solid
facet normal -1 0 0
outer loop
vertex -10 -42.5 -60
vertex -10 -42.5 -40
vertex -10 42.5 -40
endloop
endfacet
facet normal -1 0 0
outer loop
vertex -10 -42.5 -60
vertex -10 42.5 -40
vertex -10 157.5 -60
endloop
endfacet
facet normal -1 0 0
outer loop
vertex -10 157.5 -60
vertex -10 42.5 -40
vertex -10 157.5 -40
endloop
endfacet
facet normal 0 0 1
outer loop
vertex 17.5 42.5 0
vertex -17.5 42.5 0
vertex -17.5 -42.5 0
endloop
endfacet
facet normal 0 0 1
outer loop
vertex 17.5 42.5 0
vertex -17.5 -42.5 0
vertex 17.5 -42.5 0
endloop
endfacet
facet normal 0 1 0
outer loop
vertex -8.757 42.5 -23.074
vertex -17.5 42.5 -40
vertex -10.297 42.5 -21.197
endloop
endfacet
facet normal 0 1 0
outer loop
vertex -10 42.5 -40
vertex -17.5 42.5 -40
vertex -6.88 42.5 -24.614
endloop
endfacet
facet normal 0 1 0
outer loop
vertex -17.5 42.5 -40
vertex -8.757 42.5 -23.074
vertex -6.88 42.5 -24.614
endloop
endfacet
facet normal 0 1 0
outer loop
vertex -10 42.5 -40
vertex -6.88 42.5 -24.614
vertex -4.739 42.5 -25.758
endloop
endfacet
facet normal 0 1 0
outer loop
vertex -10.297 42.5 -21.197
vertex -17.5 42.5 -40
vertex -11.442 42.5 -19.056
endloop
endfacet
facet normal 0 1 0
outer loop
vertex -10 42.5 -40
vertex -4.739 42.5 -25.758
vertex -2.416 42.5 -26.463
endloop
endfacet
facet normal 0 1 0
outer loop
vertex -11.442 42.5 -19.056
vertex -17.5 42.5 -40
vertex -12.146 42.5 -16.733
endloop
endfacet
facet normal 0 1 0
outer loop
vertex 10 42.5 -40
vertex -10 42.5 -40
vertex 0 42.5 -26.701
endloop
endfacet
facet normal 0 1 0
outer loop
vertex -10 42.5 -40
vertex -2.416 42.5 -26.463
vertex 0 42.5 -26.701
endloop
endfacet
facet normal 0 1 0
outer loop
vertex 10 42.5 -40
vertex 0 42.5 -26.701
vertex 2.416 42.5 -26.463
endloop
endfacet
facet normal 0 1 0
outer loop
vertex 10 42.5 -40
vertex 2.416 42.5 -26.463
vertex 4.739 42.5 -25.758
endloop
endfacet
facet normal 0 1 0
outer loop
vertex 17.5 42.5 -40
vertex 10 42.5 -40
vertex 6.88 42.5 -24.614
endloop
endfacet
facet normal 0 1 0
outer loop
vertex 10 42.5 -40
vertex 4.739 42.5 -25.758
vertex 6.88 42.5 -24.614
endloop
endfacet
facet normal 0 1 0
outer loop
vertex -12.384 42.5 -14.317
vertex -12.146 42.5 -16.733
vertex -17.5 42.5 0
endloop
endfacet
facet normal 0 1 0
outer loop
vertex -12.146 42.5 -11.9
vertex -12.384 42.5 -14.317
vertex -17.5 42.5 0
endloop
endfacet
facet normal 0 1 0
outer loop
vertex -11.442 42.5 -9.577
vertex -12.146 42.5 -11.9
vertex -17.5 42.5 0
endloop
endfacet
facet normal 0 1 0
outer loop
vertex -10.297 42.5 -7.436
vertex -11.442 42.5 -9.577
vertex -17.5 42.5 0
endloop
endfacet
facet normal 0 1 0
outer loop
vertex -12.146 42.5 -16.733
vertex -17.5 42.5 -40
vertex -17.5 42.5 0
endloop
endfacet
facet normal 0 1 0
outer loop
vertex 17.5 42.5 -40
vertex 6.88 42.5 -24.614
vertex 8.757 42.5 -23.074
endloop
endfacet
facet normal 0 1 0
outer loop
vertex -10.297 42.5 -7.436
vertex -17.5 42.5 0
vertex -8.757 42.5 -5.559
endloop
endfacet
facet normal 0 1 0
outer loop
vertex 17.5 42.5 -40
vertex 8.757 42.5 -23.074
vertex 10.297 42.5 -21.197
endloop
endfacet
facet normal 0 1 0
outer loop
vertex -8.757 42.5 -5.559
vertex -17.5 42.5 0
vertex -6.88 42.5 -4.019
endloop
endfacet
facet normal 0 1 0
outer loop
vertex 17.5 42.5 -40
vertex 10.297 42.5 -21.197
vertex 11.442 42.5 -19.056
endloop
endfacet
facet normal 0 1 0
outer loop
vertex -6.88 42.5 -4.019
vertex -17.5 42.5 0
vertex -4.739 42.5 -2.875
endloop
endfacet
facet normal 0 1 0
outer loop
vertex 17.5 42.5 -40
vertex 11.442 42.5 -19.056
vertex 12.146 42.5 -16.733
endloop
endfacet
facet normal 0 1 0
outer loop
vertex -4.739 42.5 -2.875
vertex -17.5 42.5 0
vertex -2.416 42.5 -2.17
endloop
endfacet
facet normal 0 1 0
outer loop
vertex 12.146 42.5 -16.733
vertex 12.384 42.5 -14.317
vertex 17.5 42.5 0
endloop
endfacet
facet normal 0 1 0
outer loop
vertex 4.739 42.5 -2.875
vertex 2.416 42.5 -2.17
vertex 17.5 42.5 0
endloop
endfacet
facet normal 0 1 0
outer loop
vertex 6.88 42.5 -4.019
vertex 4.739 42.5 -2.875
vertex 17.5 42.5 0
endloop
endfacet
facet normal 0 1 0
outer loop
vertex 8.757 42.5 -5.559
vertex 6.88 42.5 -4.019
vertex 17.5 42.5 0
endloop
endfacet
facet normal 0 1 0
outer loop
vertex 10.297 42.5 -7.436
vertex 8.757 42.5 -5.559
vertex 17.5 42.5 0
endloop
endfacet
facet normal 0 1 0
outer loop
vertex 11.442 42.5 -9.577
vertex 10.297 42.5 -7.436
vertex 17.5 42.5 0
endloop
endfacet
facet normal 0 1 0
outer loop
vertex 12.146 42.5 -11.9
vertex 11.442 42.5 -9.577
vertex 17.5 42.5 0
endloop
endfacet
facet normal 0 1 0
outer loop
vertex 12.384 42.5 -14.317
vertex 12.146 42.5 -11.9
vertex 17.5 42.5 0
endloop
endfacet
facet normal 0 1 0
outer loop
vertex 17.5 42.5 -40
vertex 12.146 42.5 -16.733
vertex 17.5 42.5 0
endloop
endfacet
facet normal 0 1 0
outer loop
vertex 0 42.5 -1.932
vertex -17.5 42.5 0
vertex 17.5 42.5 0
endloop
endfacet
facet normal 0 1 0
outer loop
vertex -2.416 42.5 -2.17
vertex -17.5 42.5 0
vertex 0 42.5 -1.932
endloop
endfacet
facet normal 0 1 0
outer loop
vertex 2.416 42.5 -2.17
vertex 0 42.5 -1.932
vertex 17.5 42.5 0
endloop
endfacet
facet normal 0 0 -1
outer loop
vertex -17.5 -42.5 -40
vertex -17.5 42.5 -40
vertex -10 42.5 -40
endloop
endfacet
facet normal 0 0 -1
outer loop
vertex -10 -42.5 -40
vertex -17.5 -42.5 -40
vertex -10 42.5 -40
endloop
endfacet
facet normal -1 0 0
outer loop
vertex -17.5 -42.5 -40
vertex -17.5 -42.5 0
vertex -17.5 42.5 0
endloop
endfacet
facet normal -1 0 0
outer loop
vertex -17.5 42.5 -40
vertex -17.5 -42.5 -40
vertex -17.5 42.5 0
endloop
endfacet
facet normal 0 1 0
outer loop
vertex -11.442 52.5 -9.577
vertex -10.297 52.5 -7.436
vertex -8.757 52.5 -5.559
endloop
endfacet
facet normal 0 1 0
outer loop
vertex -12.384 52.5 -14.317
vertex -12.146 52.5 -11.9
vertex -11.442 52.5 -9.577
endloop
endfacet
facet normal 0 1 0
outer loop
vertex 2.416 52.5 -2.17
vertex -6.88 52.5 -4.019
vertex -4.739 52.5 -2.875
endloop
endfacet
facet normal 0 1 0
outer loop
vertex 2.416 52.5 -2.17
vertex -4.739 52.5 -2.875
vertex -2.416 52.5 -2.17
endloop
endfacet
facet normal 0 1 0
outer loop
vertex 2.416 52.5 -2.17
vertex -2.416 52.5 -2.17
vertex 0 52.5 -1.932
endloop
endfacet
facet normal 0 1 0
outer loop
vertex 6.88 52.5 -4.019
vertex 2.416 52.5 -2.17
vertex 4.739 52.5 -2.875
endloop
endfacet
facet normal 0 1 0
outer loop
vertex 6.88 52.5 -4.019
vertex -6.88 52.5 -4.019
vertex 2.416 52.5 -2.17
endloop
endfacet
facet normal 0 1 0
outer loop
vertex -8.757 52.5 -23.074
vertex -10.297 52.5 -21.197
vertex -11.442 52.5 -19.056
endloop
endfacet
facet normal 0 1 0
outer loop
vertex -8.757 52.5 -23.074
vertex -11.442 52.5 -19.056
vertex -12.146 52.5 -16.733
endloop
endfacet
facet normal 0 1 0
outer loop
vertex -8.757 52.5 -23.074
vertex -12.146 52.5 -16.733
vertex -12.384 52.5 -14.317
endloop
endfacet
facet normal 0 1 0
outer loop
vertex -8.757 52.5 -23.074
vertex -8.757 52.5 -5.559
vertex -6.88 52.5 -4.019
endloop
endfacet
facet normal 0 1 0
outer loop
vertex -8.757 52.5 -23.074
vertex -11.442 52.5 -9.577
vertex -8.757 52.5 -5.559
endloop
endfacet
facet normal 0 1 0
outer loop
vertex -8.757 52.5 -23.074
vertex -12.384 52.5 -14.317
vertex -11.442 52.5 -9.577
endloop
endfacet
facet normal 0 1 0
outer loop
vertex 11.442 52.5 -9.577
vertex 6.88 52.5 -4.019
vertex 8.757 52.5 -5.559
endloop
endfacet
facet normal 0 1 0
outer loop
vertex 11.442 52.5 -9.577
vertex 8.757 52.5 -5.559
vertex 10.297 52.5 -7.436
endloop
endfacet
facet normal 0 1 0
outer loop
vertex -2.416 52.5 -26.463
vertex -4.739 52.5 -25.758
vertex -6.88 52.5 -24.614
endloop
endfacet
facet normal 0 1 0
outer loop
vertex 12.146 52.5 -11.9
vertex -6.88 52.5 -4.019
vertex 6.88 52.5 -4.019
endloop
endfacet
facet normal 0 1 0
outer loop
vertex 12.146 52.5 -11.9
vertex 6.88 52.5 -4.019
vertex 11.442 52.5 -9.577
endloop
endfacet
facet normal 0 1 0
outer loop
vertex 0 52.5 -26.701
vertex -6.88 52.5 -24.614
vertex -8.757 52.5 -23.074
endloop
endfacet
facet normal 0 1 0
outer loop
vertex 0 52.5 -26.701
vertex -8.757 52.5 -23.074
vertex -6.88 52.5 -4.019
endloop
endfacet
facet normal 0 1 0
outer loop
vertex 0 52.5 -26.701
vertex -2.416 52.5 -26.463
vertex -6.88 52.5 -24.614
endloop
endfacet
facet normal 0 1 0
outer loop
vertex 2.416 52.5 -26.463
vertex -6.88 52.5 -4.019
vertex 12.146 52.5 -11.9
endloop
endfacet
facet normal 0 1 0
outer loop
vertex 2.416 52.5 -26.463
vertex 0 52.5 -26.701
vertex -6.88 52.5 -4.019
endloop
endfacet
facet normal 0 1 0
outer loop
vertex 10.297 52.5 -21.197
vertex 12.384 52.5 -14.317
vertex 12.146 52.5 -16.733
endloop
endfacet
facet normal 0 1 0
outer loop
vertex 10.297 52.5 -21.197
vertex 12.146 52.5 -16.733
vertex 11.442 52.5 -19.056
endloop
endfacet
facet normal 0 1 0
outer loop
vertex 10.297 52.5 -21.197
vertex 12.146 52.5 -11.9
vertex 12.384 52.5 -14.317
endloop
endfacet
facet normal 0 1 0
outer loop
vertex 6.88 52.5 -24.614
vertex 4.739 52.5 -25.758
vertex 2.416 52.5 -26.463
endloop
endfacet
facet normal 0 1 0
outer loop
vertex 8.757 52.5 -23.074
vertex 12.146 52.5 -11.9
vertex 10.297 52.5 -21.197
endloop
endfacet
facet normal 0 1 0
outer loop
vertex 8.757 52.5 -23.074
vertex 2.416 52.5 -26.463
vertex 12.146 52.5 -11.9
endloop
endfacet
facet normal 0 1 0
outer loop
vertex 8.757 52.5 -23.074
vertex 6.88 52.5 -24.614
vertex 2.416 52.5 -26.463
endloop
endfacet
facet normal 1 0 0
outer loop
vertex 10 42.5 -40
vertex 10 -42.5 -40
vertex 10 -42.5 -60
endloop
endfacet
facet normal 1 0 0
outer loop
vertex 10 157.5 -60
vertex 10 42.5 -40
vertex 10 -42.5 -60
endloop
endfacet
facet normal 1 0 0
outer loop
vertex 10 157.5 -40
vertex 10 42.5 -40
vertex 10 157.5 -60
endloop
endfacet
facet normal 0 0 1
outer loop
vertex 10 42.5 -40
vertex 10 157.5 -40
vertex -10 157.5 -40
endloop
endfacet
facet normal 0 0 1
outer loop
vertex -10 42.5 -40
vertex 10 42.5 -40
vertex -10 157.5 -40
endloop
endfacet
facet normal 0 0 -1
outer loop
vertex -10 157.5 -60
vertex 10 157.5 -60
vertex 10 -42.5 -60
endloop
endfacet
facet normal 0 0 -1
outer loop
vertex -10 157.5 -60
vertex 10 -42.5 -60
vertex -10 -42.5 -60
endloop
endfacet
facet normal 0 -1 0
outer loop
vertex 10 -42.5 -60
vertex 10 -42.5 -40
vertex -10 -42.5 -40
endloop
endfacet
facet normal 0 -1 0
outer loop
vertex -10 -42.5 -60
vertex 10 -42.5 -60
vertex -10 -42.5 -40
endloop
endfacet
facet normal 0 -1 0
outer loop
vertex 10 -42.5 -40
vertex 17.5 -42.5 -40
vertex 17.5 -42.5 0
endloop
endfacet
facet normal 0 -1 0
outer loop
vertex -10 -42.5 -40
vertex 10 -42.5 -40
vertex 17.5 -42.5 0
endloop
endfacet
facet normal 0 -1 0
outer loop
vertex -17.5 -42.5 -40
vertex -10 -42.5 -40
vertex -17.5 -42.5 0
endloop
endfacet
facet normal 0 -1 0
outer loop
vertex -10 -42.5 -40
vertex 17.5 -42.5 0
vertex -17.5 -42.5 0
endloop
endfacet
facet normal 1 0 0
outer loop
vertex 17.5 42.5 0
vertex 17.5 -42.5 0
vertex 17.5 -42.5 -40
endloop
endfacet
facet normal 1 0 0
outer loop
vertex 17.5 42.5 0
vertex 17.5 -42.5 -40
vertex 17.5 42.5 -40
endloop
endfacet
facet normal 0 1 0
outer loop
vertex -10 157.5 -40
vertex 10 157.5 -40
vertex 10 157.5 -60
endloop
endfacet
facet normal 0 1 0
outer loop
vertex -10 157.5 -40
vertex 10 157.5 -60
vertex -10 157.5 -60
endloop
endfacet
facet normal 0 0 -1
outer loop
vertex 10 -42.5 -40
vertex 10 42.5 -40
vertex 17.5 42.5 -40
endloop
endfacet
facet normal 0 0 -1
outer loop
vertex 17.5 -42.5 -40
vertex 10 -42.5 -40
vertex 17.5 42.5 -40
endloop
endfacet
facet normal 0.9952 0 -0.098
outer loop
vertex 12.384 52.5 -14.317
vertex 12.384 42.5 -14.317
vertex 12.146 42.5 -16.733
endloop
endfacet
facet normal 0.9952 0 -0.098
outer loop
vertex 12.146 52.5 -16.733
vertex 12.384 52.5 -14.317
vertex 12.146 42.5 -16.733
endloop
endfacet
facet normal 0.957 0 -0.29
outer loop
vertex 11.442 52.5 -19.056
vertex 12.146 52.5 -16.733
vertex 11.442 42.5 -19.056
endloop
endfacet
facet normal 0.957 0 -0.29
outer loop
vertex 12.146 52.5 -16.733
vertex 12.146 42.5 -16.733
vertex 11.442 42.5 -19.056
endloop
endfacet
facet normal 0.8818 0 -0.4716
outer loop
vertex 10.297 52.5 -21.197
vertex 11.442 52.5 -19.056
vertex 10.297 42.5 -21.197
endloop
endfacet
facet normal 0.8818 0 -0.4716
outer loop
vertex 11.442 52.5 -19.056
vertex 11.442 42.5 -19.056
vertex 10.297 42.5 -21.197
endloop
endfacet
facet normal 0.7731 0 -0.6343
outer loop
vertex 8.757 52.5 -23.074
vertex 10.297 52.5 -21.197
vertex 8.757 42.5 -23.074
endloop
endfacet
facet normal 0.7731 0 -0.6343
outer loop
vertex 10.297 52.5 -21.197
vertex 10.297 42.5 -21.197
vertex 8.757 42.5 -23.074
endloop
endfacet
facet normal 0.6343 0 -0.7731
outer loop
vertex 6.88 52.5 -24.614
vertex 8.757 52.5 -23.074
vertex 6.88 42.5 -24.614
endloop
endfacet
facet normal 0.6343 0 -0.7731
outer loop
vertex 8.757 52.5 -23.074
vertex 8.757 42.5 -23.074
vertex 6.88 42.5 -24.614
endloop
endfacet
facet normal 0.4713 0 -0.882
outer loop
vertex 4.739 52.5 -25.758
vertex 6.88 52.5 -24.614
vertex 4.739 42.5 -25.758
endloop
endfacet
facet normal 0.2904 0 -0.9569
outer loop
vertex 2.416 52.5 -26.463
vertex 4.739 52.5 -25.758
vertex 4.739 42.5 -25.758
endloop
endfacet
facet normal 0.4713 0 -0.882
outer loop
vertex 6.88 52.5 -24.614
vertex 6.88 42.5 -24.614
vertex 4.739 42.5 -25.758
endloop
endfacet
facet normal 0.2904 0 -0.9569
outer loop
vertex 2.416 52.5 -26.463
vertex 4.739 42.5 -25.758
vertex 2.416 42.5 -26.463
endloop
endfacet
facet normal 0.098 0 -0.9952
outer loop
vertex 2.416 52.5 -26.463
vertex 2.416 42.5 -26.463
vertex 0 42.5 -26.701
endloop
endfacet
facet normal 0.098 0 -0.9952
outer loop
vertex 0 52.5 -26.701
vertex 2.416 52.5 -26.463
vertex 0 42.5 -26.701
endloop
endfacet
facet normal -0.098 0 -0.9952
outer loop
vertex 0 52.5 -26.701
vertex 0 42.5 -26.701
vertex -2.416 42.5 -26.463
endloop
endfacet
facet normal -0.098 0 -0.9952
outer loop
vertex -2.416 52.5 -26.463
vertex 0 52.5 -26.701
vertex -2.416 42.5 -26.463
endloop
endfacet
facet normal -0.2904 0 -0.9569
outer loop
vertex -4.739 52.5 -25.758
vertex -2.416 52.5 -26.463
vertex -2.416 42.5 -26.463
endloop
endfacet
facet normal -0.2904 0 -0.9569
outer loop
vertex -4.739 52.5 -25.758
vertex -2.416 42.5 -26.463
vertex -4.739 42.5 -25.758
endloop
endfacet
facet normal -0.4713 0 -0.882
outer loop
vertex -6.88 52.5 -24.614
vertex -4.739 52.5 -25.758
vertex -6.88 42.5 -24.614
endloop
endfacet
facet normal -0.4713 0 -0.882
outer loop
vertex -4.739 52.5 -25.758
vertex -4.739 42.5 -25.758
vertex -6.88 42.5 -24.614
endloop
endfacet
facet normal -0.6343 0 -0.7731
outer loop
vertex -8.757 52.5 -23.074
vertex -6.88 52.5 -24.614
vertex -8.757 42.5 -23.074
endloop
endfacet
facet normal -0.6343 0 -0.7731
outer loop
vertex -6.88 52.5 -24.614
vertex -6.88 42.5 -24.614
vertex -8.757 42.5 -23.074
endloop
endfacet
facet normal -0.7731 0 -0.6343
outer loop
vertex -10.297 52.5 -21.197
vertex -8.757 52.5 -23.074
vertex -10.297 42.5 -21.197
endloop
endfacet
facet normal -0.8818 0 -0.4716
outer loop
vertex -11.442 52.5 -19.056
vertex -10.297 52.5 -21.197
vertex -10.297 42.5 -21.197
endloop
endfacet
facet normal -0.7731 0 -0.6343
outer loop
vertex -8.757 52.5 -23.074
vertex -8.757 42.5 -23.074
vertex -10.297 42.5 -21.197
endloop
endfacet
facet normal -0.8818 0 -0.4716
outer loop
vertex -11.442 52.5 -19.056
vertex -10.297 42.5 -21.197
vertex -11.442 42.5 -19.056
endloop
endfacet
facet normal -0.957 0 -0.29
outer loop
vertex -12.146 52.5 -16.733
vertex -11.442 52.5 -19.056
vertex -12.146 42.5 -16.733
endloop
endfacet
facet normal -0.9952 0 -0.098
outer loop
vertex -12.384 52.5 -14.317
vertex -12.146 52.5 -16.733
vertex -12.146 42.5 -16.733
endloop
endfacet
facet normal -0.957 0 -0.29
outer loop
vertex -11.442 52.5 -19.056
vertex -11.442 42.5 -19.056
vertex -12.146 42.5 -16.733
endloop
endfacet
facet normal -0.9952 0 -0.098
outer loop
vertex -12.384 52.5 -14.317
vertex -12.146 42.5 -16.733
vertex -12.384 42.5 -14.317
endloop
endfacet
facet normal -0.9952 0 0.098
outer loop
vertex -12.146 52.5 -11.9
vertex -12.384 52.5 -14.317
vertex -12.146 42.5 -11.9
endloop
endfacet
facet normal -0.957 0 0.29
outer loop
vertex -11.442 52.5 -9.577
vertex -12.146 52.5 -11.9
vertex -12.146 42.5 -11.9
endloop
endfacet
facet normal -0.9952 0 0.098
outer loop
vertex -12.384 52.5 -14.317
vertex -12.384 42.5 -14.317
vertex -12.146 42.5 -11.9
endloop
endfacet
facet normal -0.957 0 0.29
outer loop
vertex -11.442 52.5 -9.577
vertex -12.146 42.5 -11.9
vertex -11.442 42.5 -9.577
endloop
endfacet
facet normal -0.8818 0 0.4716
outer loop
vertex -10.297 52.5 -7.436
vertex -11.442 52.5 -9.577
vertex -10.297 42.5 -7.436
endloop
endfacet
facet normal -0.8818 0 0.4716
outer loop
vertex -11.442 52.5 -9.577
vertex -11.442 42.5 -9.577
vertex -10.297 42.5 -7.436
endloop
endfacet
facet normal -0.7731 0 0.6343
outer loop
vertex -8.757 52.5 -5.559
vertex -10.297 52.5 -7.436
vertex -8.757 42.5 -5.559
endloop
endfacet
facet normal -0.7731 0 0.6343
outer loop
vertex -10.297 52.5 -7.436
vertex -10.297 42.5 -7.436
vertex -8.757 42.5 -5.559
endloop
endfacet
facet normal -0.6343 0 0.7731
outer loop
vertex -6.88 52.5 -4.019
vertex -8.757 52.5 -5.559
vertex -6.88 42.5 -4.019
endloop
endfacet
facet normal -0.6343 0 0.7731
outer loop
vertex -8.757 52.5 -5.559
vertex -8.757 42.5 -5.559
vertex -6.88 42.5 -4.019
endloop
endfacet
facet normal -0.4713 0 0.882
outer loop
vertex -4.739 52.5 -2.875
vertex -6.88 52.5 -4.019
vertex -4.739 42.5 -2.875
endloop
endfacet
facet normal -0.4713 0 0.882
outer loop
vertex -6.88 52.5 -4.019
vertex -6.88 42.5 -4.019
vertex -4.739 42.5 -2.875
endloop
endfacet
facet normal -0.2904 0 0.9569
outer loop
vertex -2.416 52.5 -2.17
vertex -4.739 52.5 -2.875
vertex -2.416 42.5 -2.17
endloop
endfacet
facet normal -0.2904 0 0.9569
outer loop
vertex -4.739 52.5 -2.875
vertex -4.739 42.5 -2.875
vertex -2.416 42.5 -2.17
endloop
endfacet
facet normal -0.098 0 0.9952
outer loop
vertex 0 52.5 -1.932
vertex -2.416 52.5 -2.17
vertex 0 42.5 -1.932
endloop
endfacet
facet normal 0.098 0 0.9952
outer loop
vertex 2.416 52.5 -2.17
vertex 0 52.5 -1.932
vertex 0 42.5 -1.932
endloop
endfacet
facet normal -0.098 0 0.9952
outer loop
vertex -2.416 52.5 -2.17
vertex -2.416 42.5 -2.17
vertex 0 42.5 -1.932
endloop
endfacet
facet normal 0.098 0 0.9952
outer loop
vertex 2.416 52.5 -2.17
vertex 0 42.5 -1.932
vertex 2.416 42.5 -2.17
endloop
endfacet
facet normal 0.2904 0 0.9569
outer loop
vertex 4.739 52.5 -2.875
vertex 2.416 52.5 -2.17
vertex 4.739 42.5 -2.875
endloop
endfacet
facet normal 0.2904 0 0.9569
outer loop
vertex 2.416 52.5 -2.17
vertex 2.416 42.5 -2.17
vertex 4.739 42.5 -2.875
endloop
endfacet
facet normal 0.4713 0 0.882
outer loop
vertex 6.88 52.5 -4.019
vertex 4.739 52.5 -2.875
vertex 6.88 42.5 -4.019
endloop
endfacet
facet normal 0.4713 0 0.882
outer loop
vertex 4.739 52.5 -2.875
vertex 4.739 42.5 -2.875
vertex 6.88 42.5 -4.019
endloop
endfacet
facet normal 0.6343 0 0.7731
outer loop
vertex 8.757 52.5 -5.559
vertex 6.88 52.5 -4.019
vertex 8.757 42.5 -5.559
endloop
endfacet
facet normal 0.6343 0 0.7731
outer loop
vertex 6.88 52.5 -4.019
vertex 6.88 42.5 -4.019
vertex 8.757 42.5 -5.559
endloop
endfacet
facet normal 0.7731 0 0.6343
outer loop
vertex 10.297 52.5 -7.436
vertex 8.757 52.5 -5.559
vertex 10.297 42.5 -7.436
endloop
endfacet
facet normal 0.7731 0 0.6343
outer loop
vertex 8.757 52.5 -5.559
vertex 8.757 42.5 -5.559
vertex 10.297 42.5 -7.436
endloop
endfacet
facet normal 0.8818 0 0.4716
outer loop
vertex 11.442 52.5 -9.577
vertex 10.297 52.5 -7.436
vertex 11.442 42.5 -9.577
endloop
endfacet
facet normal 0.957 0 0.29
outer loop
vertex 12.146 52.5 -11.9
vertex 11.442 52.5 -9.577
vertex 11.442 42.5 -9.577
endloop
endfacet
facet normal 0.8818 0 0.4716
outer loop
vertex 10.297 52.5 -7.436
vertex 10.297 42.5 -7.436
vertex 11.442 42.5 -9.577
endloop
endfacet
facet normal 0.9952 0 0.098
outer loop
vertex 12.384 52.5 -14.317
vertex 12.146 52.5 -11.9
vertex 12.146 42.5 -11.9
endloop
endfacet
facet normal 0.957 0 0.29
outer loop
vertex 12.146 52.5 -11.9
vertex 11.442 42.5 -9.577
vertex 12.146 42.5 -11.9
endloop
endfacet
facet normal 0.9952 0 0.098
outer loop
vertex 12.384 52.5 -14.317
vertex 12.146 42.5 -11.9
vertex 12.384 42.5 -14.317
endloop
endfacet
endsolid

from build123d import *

# Parameters (mm, degrees)
SKIZZE1_W                       = 35
SKIZZE1_H                       = 85
AUFSATZ_LINEAR_AUSTRAGEN1_DEPTH = 40
SKIZZE2_R                       = 12.384443891
AUFSATZ_LINEAR_AUSTRAGEN2_DEPTH = 10
SKIZZE3_W                       = 20
SKIZZE3_H                       = 200
AUFSATZ_LINEAR_AUSTRAGEN3_DEPTH = 20


with BuildPart() as part:
    # Skizze1 → Aufsatz-Linear austragen1 (new body)
    with BuildSketch(Plane.XY):
        Rectangle(SKIZZE1_W, SKIZZE1_H)
    extrude(amount=-AUFSATZ_LINEAR_AUSTRAGEN1_DEPTH)

    # Skizze2 → Aufsatz-Linear austragen2 (add)
    with BuildSketch(Plane(origin=(0, 42.5, 0), x_dir=(1, 0, 0), z_dir=(0, 1, 0))):
        with Locations((0, 14.316526297)):
            Circle(SKIZZE2_R)
    extrude(amount=AUFSATZ_LINEAR_AUSTRAGEN2_DEPTH)

    # Skizze3 → Aufsatz-Linear austragen3 (add)
    with BuildSketch(Plane(origin=(0, 0, -40), x_dir=(-1, 0, 0), z_dir=(0, 0, -1))):
        with Locations((0, 57.5)):
            Rectangle(SKIZZE3_W, SKIZZE3_H)
    extrude(amount=AUFSATZ_LINEAR_AUSTRAGEN3_DEPTH)


solid = part.part
